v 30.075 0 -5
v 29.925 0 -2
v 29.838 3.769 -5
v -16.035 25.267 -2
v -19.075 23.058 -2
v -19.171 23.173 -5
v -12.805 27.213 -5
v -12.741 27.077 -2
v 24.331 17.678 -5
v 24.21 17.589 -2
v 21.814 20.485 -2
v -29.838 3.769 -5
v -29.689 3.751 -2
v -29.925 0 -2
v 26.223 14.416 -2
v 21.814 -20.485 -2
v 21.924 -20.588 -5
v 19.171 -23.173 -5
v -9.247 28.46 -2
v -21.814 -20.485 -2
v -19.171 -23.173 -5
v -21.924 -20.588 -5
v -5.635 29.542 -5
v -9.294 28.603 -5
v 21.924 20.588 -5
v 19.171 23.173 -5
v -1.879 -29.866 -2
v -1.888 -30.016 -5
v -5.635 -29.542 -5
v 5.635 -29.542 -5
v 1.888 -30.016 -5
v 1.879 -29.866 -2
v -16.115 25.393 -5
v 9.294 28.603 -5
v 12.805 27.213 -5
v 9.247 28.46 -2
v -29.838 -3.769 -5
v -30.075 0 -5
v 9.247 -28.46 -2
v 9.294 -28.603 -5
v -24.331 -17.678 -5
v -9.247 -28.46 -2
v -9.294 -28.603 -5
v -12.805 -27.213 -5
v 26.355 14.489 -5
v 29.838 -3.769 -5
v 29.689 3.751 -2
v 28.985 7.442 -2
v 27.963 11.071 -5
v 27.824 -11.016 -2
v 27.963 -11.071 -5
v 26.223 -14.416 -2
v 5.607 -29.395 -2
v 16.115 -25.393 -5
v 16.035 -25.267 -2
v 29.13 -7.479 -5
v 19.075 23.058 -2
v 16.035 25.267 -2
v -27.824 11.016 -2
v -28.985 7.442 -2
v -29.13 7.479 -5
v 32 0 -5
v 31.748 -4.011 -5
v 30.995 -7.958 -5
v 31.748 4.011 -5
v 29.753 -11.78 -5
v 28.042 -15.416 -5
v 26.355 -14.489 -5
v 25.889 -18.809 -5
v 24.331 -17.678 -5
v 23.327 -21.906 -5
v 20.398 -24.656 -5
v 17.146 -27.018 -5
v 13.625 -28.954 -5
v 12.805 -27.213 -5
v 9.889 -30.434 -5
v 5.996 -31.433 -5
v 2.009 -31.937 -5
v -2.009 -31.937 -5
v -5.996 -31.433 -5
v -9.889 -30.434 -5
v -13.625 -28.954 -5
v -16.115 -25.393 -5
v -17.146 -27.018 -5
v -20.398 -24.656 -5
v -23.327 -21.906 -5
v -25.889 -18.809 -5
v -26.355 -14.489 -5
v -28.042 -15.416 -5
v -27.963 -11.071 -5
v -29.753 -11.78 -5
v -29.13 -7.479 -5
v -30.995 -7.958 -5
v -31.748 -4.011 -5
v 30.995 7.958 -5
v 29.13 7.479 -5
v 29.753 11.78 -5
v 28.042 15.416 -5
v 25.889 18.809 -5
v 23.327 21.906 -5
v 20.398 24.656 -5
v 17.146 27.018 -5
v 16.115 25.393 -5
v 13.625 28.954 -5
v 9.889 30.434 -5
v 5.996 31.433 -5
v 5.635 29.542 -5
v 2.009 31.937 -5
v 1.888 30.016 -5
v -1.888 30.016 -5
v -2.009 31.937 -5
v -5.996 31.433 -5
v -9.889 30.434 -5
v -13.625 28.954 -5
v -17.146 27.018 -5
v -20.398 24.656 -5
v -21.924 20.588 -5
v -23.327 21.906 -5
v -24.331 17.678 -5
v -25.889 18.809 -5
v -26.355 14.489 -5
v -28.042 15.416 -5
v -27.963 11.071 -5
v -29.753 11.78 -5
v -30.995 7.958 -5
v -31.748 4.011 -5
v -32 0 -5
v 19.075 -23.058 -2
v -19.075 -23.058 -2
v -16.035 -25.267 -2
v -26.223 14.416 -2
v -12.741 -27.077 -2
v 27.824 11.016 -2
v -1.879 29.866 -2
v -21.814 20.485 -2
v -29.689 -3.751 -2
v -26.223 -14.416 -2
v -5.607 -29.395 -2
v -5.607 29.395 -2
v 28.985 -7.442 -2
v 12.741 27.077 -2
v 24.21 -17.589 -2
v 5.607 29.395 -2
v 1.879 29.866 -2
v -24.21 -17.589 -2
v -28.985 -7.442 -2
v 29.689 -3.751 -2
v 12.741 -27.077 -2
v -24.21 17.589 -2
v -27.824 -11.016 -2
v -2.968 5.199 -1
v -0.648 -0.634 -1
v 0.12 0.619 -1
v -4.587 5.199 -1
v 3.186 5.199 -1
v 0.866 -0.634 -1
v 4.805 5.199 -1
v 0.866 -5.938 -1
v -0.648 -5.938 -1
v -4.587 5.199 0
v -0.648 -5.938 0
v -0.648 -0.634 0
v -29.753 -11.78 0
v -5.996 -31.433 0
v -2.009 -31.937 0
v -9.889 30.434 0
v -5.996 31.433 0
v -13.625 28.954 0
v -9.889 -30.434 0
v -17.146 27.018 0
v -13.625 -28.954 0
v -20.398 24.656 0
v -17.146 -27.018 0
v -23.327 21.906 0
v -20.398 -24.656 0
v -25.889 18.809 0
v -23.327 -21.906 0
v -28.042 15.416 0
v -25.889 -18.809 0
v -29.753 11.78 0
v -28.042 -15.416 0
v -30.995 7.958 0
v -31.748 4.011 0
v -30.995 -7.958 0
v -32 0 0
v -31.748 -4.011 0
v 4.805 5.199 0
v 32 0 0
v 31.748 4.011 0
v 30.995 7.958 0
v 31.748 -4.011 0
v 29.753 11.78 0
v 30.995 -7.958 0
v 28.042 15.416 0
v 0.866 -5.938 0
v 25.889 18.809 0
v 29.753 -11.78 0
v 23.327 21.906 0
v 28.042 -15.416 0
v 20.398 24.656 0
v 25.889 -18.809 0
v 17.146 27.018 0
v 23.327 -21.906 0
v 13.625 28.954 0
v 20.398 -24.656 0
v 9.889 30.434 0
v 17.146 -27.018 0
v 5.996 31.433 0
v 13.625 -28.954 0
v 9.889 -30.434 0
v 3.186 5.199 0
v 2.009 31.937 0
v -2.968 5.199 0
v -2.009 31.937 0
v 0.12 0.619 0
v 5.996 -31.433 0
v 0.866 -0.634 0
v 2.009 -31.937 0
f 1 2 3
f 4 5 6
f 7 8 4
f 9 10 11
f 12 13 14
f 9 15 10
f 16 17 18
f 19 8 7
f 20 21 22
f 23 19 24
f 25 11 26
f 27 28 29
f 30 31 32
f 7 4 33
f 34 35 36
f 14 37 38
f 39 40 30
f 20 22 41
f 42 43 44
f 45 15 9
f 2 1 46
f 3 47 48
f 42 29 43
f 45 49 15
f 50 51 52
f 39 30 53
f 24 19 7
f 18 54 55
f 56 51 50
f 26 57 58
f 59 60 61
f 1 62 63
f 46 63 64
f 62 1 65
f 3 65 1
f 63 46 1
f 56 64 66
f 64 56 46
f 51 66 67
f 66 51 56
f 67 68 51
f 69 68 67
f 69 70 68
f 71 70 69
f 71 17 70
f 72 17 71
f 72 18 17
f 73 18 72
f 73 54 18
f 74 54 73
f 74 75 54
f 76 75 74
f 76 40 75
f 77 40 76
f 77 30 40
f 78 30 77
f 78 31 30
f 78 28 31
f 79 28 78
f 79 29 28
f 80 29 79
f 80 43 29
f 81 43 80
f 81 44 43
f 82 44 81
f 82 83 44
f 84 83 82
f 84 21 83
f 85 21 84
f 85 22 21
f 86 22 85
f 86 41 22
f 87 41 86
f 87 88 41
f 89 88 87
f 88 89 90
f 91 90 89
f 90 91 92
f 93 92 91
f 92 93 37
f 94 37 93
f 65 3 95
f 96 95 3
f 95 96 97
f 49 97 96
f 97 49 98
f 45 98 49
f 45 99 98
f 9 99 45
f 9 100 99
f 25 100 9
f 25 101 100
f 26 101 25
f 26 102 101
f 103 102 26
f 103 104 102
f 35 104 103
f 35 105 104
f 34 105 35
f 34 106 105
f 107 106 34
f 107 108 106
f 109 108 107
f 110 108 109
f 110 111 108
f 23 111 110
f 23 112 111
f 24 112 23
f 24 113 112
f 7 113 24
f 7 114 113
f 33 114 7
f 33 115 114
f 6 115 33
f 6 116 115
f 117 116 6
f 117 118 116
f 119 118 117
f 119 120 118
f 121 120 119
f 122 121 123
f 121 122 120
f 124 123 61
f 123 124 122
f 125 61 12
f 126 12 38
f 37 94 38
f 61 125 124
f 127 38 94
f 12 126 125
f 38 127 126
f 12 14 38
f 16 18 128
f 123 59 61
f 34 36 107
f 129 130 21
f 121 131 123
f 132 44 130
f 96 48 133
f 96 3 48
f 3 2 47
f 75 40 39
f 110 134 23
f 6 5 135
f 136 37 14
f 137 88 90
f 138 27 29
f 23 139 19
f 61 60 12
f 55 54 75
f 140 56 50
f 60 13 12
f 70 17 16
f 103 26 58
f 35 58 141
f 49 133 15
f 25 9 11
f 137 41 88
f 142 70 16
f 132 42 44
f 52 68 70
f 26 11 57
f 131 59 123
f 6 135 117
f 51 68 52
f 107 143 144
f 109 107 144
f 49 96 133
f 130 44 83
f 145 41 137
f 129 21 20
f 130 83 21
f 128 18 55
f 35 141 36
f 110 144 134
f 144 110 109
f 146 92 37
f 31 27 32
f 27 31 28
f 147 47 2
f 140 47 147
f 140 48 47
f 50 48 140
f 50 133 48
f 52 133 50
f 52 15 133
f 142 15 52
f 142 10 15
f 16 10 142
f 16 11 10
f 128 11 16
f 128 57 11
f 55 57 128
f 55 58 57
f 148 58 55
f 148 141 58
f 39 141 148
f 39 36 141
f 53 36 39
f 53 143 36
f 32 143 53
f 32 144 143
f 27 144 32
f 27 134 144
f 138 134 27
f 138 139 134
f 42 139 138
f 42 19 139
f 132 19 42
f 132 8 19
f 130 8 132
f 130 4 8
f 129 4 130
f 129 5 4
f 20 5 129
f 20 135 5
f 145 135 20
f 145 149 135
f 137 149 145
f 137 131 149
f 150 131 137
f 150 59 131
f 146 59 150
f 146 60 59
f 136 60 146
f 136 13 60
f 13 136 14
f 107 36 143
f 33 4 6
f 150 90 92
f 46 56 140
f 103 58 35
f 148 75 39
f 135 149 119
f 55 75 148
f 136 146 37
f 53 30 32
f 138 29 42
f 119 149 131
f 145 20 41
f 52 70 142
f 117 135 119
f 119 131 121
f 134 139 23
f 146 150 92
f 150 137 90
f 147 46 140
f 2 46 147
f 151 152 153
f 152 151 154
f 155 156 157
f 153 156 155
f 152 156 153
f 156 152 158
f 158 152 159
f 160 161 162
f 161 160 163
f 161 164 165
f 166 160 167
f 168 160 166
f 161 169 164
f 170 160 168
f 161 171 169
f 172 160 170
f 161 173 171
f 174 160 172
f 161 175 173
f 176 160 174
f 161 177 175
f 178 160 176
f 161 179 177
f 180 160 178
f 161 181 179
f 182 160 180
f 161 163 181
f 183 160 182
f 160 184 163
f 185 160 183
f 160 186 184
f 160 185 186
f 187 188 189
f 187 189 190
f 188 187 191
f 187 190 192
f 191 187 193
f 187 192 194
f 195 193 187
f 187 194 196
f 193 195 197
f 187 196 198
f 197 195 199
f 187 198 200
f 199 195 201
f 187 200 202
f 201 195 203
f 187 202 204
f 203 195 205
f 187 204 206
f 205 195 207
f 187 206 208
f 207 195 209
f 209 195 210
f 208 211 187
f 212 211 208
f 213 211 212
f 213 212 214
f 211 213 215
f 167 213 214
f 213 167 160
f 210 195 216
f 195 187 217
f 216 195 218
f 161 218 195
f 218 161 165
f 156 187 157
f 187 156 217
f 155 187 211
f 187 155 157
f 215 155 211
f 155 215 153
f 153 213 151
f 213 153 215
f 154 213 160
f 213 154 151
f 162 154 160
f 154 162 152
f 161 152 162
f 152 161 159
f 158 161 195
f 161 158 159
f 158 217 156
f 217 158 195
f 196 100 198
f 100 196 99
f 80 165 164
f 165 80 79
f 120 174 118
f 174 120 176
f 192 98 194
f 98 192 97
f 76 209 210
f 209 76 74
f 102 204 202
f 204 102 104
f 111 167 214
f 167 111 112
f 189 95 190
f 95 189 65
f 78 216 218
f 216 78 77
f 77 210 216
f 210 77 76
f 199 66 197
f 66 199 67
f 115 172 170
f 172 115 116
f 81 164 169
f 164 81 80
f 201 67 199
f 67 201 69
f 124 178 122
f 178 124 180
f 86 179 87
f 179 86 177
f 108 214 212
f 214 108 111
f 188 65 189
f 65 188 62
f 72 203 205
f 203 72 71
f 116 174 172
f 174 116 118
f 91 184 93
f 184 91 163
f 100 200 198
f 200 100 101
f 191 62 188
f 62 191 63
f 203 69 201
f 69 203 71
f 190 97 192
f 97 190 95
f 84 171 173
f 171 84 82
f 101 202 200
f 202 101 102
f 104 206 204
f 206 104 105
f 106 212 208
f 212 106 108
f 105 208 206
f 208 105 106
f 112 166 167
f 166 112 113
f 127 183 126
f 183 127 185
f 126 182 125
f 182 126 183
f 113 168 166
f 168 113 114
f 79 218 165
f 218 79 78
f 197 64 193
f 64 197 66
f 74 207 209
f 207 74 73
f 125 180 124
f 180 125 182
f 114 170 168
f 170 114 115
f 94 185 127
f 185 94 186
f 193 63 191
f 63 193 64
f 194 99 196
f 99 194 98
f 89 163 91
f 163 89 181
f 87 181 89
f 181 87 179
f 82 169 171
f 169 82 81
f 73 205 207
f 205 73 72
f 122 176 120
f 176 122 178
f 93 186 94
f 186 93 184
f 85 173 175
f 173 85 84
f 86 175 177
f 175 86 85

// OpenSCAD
$fn = 50;

difference() {
	union() {
		translate(v = [0, 0, -5.0]) {
			cylinder(h = 5, r = 32.0);
		}
	}
	union() {
		#translate(v = [0, 0, -5.0]) {
			cylinder(h = 3, r1 = 30.075, r2 = 29.925);
		}
		translate(v = [0, -0.5, -1]) {
			linear_extrude(height = 1) {
				text(font = "Webdings", halign = "center", size = 11, text = "Y", valign = "center");
			}
		}
	}
}
